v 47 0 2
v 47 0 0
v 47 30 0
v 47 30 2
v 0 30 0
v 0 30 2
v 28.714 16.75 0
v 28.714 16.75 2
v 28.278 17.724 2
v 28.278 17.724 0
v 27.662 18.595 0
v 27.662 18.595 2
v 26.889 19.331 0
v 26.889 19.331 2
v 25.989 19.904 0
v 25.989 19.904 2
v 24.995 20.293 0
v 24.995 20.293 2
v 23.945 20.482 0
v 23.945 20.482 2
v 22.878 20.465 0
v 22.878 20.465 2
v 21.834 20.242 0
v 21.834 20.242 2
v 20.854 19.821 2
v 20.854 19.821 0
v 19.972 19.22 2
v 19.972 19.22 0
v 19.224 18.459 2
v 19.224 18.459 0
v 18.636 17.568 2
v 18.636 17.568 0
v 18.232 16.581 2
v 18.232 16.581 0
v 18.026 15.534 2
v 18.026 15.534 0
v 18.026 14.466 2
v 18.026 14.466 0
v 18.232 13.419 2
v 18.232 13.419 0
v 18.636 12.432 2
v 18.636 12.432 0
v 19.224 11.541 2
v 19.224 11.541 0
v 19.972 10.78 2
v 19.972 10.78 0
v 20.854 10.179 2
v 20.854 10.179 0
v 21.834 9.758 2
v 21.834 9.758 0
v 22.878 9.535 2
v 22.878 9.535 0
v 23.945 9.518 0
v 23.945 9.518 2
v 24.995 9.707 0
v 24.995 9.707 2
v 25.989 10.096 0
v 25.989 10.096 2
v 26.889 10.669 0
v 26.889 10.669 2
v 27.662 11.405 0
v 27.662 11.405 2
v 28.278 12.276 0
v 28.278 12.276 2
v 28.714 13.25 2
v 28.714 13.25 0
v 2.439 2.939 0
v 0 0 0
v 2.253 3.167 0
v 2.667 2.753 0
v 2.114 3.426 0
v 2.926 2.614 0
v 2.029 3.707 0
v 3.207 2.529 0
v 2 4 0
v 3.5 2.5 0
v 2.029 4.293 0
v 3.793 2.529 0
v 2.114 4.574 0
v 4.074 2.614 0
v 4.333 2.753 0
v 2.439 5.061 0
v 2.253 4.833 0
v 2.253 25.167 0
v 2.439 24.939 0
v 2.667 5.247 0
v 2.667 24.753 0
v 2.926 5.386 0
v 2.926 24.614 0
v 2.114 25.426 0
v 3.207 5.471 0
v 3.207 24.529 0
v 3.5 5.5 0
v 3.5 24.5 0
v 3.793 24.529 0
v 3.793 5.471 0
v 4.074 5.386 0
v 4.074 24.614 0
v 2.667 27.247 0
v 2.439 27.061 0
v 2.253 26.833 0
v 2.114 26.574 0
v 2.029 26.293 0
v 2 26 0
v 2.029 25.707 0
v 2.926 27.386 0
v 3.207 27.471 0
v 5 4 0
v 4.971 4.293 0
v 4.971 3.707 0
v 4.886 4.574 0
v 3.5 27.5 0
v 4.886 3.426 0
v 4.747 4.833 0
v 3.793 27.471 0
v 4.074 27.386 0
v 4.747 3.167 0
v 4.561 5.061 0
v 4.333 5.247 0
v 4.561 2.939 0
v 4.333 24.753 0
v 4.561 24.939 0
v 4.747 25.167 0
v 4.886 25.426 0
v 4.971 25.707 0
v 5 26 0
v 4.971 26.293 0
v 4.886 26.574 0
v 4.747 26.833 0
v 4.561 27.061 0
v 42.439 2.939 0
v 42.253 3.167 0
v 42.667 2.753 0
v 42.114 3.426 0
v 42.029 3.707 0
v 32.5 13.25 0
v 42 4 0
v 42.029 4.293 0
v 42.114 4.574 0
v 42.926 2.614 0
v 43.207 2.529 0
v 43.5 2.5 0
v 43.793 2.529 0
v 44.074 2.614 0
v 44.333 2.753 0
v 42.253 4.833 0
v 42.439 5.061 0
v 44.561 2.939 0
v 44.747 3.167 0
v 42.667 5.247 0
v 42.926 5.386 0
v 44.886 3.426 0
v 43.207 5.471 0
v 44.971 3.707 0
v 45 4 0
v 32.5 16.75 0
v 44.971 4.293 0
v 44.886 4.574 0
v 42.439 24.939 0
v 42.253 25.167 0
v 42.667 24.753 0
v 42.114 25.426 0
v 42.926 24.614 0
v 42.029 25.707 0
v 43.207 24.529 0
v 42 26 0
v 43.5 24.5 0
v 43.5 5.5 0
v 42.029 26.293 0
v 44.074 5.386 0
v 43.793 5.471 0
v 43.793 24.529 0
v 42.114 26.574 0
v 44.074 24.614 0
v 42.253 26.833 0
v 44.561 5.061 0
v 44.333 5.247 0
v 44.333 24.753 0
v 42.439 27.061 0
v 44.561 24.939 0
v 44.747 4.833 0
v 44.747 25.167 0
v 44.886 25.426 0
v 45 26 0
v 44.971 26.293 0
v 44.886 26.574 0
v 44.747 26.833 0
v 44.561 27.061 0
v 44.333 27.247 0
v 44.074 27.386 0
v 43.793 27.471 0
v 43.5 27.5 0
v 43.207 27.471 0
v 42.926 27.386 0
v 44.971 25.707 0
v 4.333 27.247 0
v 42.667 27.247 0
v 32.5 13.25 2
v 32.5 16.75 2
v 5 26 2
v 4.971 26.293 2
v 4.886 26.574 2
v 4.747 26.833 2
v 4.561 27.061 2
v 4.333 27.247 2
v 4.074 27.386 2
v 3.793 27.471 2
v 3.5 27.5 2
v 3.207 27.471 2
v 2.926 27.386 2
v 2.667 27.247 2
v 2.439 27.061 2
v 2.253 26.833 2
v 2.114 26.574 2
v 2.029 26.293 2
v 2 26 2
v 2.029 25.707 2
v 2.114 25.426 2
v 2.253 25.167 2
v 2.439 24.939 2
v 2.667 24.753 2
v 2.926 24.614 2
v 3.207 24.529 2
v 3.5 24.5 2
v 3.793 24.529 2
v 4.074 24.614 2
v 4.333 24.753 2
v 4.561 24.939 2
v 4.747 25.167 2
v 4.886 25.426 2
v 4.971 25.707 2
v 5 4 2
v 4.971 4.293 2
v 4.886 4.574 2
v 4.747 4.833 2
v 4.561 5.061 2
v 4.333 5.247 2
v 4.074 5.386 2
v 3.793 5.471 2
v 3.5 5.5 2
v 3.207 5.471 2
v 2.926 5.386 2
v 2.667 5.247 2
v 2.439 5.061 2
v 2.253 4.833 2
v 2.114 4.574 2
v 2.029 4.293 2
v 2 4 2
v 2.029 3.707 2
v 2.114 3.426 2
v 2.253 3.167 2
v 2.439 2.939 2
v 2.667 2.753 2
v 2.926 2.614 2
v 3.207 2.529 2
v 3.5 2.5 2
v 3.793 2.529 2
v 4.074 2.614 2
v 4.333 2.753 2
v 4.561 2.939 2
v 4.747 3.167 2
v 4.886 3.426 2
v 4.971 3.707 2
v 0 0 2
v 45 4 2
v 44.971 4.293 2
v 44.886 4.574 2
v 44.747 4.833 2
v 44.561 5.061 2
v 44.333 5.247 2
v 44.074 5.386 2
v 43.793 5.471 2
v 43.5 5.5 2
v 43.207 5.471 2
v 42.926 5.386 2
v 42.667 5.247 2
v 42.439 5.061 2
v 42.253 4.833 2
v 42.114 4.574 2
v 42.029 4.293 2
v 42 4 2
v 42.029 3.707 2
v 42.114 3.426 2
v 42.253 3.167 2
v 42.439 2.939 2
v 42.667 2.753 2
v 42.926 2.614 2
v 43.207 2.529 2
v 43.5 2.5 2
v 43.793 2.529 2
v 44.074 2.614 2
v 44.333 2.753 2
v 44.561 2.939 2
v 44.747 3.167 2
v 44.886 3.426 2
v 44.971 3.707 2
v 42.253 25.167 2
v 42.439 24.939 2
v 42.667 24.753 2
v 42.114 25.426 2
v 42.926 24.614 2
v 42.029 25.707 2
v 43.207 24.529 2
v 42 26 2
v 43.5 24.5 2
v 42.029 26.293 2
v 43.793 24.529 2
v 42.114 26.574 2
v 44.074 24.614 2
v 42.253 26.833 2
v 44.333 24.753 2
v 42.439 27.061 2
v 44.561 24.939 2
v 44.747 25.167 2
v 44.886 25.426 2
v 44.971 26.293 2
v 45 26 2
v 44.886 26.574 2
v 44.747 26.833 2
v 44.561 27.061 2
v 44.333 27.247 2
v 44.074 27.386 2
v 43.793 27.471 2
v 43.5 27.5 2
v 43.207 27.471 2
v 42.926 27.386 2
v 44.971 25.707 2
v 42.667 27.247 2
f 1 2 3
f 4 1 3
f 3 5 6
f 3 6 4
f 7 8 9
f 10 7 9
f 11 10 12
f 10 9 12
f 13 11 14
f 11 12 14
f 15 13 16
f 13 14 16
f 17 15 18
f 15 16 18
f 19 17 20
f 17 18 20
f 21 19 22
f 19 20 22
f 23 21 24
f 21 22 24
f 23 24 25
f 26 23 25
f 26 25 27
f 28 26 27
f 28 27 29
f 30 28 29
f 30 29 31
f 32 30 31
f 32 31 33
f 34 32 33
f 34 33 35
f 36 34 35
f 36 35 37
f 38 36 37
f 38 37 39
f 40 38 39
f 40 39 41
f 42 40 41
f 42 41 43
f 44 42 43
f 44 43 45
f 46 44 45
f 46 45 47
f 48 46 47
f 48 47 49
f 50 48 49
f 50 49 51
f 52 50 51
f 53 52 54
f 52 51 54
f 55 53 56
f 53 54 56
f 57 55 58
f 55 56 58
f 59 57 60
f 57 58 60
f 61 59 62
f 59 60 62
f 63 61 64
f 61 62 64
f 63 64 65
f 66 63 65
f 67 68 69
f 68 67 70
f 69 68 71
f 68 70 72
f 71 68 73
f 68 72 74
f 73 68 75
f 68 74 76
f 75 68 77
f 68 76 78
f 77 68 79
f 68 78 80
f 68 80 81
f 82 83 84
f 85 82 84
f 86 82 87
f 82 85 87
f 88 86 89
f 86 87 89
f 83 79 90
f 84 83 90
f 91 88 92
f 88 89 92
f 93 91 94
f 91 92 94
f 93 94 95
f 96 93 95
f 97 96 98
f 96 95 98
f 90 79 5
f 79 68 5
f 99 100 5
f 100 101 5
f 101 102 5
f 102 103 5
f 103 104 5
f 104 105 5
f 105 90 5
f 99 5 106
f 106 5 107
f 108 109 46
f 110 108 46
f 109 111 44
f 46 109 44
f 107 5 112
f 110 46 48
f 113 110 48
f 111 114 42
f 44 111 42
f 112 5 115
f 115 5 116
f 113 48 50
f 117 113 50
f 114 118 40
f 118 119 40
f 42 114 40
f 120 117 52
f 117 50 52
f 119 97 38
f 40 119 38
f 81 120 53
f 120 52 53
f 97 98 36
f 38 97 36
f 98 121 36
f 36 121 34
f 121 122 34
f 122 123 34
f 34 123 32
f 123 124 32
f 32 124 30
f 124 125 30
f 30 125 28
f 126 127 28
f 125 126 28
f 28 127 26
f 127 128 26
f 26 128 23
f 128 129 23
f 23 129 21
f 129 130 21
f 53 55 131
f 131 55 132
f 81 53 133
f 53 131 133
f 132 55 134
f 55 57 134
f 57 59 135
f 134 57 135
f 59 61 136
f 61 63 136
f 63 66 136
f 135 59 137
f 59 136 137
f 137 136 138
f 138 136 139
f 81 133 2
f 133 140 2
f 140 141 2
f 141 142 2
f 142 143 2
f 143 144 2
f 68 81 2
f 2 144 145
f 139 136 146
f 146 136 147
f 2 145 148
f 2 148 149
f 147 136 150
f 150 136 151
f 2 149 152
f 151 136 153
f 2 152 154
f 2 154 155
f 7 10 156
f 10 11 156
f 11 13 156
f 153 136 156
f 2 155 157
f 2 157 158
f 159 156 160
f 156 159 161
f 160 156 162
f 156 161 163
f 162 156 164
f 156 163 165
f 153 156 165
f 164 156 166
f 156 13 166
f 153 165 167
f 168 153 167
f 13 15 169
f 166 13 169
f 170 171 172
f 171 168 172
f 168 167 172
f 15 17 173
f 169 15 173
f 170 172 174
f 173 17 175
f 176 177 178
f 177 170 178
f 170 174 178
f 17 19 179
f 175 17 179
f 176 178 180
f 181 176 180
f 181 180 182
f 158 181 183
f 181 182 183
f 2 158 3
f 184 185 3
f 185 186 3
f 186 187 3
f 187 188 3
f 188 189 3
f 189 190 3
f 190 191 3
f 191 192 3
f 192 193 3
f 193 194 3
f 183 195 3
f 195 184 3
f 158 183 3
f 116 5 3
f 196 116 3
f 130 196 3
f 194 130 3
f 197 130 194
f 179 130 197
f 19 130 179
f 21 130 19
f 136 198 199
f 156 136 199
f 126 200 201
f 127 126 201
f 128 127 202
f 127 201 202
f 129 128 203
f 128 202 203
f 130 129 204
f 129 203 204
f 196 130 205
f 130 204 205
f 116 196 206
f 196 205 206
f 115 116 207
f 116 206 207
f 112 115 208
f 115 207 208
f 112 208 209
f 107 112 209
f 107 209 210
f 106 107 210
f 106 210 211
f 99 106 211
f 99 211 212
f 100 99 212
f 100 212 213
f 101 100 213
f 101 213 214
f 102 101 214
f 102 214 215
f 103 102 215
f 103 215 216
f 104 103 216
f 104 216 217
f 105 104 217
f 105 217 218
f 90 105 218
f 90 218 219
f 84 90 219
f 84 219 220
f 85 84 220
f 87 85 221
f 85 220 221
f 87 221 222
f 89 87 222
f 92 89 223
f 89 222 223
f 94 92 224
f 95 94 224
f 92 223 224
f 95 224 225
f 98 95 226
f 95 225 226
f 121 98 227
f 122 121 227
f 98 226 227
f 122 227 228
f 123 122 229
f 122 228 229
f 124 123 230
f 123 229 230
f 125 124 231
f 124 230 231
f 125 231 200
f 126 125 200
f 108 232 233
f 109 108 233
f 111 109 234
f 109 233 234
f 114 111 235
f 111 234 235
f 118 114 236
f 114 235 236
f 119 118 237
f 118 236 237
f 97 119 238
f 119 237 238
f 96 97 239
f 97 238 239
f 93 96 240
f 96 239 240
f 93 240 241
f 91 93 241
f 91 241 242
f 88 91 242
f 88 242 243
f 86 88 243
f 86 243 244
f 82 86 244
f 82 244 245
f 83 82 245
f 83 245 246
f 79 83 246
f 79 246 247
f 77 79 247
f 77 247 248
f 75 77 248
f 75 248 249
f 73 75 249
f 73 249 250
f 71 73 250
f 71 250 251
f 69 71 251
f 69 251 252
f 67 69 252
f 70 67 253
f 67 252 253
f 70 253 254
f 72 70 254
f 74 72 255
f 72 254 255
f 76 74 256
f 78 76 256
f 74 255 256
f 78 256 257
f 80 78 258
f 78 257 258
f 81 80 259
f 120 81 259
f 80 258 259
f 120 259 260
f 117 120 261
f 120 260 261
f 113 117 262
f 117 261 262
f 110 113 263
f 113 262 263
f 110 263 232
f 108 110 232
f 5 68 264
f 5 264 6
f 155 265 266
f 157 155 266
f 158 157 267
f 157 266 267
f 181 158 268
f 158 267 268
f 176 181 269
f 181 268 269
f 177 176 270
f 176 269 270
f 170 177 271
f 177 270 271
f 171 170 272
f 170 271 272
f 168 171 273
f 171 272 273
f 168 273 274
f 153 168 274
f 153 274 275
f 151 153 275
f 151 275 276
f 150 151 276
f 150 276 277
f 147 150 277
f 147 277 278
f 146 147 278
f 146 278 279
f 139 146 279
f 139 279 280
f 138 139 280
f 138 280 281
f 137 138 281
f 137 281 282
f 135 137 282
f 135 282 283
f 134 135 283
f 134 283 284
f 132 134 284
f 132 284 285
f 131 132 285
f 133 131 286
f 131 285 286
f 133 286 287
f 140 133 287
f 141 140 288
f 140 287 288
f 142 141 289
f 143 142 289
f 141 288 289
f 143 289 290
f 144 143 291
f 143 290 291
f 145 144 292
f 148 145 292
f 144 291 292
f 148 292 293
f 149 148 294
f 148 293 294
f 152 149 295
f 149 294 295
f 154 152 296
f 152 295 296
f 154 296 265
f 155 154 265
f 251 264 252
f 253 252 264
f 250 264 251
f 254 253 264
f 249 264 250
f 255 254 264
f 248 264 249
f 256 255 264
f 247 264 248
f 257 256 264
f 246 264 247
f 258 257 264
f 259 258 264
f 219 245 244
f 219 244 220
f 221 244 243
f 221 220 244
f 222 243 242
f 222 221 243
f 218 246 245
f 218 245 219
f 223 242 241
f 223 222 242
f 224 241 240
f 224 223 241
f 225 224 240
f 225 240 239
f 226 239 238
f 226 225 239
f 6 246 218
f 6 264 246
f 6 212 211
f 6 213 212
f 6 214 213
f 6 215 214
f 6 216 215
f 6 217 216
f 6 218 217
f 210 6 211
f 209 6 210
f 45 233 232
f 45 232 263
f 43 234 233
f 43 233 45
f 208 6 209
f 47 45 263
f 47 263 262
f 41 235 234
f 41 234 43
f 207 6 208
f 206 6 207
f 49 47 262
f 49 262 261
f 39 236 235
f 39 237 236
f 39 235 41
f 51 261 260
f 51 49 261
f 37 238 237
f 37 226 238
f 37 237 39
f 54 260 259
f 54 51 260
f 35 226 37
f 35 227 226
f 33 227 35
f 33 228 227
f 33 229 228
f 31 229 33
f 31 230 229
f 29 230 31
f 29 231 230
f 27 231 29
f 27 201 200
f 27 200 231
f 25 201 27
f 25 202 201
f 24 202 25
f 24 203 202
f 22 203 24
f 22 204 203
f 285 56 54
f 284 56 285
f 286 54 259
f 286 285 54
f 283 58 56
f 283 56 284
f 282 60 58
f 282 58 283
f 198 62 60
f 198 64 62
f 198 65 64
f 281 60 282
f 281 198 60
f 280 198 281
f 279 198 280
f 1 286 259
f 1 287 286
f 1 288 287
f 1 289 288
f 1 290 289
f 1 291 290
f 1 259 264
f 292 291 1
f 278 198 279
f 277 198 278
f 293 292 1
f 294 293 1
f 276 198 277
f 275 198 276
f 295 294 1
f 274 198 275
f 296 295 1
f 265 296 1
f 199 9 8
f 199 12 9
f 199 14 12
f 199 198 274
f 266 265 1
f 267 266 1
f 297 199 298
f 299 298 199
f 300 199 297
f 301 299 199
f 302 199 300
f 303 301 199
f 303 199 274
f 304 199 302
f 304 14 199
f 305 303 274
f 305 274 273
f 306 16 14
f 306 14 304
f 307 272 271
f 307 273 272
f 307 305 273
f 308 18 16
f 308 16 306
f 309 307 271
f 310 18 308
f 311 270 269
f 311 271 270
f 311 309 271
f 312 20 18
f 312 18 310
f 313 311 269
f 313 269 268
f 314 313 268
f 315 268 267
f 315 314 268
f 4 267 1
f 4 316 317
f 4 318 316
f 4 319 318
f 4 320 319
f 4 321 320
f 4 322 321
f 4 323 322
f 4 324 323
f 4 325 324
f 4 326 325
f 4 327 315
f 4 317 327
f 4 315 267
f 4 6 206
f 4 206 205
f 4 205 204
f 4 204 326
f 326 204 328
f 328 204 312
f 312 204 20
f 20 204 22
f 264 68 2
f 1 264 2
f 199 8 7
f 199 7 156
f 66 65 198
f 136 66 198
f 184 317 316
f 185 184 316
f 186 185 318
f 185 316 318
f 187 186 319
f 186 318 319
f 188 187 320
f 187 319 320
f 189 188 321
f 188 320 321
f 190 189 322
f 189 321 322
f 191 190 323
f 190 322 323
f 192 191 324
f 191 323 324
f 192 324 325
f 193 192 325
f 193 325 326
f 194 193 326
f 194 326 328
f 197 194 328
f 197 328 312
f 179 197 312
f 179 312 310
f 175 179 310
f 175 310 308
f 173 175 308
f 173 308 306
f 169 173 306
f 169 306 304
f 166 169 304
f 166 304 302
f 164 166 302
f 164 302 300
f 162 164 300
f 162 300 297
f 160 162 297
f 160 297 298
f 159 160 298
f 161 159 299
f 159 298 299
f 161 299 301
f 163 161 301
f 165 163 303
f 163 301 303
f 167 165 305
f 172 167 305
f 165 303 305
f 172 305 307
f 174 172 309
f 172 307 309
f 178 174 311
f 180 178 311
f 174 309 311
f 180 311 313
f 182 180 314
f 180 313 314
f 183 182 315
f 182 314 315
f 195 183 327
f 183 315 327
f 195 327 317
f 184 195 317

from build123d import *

# Parameters (mm, degrees)
SKETCH_1_W          = 47
SKETCH_1_H          = 30
EXTRUDE_1_DEPTH     = 2
SKETCH_2_R          = 5.5
CUT_EXTRUDE_1_DEPTH = 56.794264938
SKETCH_3_W          = 7
SKETCH_3_H          = 3.5
CUT_EXTRUDE_2_DEPTH = 56.794264938
SKETCH_4_R          = 1.5
CUT_EXTRUDE_3_DEPTH = 56.794264938


with BuildPart() as part:
    # Эскиз1 → Бобышка-Вытянуть1 (new body)
    with BuildSketch(Plane.XY):
        with Locations((23.5, 15)):
            Rectangle(SKETCH_1_W, SKETCH_1_H)
    extrude(amount=EXTRUDE_1_DEPTH)

    # Эскиз2 → Вырез-Вытянуть1 (cut, through all)
    with BuildSketch(Plane.XY.offset(2)):
        with Locations((23.5, 15)):
            Circle(SKETCH_2_R)
    extrude(amount=-CUT_EXTRUDE_1_DEPTH, mode=Mode.SUBTRACT)

    # Эскиз3 → Вырез-Вытянуть2 (cut, through all)
    with BuildSketch(Plane.XY.offset(2)):
        with Locations((29, 15)):
            Rectangle(SKETCH_3_W, SKETCH_3_H)
    extrude(amount=-CUT_EXTRUDE_2_DEPTH, mode=Mode.SUBTRACT)

    # Эскиз4 → Вырез-Вытянуть3 (cut, through all)
    with BuildSketch(Plane.XY.offset(2)):
        with Locations((3.5, 4)):
            Circle(SKETCH_4_R)
        with Locations((43.5, 4)):
            Circle(SKETCH_4_R)
        with Locations((43.5, 26)):
            Circle(SKETCH_4_R)
        with Locations((3.5, 26)):
            Circle(SKETCH_4_R)
    extrude(amount=-CUT_EXTRUDE_3_DEPTH, mode=Mode.SUBTRACT)


solid = part.part
